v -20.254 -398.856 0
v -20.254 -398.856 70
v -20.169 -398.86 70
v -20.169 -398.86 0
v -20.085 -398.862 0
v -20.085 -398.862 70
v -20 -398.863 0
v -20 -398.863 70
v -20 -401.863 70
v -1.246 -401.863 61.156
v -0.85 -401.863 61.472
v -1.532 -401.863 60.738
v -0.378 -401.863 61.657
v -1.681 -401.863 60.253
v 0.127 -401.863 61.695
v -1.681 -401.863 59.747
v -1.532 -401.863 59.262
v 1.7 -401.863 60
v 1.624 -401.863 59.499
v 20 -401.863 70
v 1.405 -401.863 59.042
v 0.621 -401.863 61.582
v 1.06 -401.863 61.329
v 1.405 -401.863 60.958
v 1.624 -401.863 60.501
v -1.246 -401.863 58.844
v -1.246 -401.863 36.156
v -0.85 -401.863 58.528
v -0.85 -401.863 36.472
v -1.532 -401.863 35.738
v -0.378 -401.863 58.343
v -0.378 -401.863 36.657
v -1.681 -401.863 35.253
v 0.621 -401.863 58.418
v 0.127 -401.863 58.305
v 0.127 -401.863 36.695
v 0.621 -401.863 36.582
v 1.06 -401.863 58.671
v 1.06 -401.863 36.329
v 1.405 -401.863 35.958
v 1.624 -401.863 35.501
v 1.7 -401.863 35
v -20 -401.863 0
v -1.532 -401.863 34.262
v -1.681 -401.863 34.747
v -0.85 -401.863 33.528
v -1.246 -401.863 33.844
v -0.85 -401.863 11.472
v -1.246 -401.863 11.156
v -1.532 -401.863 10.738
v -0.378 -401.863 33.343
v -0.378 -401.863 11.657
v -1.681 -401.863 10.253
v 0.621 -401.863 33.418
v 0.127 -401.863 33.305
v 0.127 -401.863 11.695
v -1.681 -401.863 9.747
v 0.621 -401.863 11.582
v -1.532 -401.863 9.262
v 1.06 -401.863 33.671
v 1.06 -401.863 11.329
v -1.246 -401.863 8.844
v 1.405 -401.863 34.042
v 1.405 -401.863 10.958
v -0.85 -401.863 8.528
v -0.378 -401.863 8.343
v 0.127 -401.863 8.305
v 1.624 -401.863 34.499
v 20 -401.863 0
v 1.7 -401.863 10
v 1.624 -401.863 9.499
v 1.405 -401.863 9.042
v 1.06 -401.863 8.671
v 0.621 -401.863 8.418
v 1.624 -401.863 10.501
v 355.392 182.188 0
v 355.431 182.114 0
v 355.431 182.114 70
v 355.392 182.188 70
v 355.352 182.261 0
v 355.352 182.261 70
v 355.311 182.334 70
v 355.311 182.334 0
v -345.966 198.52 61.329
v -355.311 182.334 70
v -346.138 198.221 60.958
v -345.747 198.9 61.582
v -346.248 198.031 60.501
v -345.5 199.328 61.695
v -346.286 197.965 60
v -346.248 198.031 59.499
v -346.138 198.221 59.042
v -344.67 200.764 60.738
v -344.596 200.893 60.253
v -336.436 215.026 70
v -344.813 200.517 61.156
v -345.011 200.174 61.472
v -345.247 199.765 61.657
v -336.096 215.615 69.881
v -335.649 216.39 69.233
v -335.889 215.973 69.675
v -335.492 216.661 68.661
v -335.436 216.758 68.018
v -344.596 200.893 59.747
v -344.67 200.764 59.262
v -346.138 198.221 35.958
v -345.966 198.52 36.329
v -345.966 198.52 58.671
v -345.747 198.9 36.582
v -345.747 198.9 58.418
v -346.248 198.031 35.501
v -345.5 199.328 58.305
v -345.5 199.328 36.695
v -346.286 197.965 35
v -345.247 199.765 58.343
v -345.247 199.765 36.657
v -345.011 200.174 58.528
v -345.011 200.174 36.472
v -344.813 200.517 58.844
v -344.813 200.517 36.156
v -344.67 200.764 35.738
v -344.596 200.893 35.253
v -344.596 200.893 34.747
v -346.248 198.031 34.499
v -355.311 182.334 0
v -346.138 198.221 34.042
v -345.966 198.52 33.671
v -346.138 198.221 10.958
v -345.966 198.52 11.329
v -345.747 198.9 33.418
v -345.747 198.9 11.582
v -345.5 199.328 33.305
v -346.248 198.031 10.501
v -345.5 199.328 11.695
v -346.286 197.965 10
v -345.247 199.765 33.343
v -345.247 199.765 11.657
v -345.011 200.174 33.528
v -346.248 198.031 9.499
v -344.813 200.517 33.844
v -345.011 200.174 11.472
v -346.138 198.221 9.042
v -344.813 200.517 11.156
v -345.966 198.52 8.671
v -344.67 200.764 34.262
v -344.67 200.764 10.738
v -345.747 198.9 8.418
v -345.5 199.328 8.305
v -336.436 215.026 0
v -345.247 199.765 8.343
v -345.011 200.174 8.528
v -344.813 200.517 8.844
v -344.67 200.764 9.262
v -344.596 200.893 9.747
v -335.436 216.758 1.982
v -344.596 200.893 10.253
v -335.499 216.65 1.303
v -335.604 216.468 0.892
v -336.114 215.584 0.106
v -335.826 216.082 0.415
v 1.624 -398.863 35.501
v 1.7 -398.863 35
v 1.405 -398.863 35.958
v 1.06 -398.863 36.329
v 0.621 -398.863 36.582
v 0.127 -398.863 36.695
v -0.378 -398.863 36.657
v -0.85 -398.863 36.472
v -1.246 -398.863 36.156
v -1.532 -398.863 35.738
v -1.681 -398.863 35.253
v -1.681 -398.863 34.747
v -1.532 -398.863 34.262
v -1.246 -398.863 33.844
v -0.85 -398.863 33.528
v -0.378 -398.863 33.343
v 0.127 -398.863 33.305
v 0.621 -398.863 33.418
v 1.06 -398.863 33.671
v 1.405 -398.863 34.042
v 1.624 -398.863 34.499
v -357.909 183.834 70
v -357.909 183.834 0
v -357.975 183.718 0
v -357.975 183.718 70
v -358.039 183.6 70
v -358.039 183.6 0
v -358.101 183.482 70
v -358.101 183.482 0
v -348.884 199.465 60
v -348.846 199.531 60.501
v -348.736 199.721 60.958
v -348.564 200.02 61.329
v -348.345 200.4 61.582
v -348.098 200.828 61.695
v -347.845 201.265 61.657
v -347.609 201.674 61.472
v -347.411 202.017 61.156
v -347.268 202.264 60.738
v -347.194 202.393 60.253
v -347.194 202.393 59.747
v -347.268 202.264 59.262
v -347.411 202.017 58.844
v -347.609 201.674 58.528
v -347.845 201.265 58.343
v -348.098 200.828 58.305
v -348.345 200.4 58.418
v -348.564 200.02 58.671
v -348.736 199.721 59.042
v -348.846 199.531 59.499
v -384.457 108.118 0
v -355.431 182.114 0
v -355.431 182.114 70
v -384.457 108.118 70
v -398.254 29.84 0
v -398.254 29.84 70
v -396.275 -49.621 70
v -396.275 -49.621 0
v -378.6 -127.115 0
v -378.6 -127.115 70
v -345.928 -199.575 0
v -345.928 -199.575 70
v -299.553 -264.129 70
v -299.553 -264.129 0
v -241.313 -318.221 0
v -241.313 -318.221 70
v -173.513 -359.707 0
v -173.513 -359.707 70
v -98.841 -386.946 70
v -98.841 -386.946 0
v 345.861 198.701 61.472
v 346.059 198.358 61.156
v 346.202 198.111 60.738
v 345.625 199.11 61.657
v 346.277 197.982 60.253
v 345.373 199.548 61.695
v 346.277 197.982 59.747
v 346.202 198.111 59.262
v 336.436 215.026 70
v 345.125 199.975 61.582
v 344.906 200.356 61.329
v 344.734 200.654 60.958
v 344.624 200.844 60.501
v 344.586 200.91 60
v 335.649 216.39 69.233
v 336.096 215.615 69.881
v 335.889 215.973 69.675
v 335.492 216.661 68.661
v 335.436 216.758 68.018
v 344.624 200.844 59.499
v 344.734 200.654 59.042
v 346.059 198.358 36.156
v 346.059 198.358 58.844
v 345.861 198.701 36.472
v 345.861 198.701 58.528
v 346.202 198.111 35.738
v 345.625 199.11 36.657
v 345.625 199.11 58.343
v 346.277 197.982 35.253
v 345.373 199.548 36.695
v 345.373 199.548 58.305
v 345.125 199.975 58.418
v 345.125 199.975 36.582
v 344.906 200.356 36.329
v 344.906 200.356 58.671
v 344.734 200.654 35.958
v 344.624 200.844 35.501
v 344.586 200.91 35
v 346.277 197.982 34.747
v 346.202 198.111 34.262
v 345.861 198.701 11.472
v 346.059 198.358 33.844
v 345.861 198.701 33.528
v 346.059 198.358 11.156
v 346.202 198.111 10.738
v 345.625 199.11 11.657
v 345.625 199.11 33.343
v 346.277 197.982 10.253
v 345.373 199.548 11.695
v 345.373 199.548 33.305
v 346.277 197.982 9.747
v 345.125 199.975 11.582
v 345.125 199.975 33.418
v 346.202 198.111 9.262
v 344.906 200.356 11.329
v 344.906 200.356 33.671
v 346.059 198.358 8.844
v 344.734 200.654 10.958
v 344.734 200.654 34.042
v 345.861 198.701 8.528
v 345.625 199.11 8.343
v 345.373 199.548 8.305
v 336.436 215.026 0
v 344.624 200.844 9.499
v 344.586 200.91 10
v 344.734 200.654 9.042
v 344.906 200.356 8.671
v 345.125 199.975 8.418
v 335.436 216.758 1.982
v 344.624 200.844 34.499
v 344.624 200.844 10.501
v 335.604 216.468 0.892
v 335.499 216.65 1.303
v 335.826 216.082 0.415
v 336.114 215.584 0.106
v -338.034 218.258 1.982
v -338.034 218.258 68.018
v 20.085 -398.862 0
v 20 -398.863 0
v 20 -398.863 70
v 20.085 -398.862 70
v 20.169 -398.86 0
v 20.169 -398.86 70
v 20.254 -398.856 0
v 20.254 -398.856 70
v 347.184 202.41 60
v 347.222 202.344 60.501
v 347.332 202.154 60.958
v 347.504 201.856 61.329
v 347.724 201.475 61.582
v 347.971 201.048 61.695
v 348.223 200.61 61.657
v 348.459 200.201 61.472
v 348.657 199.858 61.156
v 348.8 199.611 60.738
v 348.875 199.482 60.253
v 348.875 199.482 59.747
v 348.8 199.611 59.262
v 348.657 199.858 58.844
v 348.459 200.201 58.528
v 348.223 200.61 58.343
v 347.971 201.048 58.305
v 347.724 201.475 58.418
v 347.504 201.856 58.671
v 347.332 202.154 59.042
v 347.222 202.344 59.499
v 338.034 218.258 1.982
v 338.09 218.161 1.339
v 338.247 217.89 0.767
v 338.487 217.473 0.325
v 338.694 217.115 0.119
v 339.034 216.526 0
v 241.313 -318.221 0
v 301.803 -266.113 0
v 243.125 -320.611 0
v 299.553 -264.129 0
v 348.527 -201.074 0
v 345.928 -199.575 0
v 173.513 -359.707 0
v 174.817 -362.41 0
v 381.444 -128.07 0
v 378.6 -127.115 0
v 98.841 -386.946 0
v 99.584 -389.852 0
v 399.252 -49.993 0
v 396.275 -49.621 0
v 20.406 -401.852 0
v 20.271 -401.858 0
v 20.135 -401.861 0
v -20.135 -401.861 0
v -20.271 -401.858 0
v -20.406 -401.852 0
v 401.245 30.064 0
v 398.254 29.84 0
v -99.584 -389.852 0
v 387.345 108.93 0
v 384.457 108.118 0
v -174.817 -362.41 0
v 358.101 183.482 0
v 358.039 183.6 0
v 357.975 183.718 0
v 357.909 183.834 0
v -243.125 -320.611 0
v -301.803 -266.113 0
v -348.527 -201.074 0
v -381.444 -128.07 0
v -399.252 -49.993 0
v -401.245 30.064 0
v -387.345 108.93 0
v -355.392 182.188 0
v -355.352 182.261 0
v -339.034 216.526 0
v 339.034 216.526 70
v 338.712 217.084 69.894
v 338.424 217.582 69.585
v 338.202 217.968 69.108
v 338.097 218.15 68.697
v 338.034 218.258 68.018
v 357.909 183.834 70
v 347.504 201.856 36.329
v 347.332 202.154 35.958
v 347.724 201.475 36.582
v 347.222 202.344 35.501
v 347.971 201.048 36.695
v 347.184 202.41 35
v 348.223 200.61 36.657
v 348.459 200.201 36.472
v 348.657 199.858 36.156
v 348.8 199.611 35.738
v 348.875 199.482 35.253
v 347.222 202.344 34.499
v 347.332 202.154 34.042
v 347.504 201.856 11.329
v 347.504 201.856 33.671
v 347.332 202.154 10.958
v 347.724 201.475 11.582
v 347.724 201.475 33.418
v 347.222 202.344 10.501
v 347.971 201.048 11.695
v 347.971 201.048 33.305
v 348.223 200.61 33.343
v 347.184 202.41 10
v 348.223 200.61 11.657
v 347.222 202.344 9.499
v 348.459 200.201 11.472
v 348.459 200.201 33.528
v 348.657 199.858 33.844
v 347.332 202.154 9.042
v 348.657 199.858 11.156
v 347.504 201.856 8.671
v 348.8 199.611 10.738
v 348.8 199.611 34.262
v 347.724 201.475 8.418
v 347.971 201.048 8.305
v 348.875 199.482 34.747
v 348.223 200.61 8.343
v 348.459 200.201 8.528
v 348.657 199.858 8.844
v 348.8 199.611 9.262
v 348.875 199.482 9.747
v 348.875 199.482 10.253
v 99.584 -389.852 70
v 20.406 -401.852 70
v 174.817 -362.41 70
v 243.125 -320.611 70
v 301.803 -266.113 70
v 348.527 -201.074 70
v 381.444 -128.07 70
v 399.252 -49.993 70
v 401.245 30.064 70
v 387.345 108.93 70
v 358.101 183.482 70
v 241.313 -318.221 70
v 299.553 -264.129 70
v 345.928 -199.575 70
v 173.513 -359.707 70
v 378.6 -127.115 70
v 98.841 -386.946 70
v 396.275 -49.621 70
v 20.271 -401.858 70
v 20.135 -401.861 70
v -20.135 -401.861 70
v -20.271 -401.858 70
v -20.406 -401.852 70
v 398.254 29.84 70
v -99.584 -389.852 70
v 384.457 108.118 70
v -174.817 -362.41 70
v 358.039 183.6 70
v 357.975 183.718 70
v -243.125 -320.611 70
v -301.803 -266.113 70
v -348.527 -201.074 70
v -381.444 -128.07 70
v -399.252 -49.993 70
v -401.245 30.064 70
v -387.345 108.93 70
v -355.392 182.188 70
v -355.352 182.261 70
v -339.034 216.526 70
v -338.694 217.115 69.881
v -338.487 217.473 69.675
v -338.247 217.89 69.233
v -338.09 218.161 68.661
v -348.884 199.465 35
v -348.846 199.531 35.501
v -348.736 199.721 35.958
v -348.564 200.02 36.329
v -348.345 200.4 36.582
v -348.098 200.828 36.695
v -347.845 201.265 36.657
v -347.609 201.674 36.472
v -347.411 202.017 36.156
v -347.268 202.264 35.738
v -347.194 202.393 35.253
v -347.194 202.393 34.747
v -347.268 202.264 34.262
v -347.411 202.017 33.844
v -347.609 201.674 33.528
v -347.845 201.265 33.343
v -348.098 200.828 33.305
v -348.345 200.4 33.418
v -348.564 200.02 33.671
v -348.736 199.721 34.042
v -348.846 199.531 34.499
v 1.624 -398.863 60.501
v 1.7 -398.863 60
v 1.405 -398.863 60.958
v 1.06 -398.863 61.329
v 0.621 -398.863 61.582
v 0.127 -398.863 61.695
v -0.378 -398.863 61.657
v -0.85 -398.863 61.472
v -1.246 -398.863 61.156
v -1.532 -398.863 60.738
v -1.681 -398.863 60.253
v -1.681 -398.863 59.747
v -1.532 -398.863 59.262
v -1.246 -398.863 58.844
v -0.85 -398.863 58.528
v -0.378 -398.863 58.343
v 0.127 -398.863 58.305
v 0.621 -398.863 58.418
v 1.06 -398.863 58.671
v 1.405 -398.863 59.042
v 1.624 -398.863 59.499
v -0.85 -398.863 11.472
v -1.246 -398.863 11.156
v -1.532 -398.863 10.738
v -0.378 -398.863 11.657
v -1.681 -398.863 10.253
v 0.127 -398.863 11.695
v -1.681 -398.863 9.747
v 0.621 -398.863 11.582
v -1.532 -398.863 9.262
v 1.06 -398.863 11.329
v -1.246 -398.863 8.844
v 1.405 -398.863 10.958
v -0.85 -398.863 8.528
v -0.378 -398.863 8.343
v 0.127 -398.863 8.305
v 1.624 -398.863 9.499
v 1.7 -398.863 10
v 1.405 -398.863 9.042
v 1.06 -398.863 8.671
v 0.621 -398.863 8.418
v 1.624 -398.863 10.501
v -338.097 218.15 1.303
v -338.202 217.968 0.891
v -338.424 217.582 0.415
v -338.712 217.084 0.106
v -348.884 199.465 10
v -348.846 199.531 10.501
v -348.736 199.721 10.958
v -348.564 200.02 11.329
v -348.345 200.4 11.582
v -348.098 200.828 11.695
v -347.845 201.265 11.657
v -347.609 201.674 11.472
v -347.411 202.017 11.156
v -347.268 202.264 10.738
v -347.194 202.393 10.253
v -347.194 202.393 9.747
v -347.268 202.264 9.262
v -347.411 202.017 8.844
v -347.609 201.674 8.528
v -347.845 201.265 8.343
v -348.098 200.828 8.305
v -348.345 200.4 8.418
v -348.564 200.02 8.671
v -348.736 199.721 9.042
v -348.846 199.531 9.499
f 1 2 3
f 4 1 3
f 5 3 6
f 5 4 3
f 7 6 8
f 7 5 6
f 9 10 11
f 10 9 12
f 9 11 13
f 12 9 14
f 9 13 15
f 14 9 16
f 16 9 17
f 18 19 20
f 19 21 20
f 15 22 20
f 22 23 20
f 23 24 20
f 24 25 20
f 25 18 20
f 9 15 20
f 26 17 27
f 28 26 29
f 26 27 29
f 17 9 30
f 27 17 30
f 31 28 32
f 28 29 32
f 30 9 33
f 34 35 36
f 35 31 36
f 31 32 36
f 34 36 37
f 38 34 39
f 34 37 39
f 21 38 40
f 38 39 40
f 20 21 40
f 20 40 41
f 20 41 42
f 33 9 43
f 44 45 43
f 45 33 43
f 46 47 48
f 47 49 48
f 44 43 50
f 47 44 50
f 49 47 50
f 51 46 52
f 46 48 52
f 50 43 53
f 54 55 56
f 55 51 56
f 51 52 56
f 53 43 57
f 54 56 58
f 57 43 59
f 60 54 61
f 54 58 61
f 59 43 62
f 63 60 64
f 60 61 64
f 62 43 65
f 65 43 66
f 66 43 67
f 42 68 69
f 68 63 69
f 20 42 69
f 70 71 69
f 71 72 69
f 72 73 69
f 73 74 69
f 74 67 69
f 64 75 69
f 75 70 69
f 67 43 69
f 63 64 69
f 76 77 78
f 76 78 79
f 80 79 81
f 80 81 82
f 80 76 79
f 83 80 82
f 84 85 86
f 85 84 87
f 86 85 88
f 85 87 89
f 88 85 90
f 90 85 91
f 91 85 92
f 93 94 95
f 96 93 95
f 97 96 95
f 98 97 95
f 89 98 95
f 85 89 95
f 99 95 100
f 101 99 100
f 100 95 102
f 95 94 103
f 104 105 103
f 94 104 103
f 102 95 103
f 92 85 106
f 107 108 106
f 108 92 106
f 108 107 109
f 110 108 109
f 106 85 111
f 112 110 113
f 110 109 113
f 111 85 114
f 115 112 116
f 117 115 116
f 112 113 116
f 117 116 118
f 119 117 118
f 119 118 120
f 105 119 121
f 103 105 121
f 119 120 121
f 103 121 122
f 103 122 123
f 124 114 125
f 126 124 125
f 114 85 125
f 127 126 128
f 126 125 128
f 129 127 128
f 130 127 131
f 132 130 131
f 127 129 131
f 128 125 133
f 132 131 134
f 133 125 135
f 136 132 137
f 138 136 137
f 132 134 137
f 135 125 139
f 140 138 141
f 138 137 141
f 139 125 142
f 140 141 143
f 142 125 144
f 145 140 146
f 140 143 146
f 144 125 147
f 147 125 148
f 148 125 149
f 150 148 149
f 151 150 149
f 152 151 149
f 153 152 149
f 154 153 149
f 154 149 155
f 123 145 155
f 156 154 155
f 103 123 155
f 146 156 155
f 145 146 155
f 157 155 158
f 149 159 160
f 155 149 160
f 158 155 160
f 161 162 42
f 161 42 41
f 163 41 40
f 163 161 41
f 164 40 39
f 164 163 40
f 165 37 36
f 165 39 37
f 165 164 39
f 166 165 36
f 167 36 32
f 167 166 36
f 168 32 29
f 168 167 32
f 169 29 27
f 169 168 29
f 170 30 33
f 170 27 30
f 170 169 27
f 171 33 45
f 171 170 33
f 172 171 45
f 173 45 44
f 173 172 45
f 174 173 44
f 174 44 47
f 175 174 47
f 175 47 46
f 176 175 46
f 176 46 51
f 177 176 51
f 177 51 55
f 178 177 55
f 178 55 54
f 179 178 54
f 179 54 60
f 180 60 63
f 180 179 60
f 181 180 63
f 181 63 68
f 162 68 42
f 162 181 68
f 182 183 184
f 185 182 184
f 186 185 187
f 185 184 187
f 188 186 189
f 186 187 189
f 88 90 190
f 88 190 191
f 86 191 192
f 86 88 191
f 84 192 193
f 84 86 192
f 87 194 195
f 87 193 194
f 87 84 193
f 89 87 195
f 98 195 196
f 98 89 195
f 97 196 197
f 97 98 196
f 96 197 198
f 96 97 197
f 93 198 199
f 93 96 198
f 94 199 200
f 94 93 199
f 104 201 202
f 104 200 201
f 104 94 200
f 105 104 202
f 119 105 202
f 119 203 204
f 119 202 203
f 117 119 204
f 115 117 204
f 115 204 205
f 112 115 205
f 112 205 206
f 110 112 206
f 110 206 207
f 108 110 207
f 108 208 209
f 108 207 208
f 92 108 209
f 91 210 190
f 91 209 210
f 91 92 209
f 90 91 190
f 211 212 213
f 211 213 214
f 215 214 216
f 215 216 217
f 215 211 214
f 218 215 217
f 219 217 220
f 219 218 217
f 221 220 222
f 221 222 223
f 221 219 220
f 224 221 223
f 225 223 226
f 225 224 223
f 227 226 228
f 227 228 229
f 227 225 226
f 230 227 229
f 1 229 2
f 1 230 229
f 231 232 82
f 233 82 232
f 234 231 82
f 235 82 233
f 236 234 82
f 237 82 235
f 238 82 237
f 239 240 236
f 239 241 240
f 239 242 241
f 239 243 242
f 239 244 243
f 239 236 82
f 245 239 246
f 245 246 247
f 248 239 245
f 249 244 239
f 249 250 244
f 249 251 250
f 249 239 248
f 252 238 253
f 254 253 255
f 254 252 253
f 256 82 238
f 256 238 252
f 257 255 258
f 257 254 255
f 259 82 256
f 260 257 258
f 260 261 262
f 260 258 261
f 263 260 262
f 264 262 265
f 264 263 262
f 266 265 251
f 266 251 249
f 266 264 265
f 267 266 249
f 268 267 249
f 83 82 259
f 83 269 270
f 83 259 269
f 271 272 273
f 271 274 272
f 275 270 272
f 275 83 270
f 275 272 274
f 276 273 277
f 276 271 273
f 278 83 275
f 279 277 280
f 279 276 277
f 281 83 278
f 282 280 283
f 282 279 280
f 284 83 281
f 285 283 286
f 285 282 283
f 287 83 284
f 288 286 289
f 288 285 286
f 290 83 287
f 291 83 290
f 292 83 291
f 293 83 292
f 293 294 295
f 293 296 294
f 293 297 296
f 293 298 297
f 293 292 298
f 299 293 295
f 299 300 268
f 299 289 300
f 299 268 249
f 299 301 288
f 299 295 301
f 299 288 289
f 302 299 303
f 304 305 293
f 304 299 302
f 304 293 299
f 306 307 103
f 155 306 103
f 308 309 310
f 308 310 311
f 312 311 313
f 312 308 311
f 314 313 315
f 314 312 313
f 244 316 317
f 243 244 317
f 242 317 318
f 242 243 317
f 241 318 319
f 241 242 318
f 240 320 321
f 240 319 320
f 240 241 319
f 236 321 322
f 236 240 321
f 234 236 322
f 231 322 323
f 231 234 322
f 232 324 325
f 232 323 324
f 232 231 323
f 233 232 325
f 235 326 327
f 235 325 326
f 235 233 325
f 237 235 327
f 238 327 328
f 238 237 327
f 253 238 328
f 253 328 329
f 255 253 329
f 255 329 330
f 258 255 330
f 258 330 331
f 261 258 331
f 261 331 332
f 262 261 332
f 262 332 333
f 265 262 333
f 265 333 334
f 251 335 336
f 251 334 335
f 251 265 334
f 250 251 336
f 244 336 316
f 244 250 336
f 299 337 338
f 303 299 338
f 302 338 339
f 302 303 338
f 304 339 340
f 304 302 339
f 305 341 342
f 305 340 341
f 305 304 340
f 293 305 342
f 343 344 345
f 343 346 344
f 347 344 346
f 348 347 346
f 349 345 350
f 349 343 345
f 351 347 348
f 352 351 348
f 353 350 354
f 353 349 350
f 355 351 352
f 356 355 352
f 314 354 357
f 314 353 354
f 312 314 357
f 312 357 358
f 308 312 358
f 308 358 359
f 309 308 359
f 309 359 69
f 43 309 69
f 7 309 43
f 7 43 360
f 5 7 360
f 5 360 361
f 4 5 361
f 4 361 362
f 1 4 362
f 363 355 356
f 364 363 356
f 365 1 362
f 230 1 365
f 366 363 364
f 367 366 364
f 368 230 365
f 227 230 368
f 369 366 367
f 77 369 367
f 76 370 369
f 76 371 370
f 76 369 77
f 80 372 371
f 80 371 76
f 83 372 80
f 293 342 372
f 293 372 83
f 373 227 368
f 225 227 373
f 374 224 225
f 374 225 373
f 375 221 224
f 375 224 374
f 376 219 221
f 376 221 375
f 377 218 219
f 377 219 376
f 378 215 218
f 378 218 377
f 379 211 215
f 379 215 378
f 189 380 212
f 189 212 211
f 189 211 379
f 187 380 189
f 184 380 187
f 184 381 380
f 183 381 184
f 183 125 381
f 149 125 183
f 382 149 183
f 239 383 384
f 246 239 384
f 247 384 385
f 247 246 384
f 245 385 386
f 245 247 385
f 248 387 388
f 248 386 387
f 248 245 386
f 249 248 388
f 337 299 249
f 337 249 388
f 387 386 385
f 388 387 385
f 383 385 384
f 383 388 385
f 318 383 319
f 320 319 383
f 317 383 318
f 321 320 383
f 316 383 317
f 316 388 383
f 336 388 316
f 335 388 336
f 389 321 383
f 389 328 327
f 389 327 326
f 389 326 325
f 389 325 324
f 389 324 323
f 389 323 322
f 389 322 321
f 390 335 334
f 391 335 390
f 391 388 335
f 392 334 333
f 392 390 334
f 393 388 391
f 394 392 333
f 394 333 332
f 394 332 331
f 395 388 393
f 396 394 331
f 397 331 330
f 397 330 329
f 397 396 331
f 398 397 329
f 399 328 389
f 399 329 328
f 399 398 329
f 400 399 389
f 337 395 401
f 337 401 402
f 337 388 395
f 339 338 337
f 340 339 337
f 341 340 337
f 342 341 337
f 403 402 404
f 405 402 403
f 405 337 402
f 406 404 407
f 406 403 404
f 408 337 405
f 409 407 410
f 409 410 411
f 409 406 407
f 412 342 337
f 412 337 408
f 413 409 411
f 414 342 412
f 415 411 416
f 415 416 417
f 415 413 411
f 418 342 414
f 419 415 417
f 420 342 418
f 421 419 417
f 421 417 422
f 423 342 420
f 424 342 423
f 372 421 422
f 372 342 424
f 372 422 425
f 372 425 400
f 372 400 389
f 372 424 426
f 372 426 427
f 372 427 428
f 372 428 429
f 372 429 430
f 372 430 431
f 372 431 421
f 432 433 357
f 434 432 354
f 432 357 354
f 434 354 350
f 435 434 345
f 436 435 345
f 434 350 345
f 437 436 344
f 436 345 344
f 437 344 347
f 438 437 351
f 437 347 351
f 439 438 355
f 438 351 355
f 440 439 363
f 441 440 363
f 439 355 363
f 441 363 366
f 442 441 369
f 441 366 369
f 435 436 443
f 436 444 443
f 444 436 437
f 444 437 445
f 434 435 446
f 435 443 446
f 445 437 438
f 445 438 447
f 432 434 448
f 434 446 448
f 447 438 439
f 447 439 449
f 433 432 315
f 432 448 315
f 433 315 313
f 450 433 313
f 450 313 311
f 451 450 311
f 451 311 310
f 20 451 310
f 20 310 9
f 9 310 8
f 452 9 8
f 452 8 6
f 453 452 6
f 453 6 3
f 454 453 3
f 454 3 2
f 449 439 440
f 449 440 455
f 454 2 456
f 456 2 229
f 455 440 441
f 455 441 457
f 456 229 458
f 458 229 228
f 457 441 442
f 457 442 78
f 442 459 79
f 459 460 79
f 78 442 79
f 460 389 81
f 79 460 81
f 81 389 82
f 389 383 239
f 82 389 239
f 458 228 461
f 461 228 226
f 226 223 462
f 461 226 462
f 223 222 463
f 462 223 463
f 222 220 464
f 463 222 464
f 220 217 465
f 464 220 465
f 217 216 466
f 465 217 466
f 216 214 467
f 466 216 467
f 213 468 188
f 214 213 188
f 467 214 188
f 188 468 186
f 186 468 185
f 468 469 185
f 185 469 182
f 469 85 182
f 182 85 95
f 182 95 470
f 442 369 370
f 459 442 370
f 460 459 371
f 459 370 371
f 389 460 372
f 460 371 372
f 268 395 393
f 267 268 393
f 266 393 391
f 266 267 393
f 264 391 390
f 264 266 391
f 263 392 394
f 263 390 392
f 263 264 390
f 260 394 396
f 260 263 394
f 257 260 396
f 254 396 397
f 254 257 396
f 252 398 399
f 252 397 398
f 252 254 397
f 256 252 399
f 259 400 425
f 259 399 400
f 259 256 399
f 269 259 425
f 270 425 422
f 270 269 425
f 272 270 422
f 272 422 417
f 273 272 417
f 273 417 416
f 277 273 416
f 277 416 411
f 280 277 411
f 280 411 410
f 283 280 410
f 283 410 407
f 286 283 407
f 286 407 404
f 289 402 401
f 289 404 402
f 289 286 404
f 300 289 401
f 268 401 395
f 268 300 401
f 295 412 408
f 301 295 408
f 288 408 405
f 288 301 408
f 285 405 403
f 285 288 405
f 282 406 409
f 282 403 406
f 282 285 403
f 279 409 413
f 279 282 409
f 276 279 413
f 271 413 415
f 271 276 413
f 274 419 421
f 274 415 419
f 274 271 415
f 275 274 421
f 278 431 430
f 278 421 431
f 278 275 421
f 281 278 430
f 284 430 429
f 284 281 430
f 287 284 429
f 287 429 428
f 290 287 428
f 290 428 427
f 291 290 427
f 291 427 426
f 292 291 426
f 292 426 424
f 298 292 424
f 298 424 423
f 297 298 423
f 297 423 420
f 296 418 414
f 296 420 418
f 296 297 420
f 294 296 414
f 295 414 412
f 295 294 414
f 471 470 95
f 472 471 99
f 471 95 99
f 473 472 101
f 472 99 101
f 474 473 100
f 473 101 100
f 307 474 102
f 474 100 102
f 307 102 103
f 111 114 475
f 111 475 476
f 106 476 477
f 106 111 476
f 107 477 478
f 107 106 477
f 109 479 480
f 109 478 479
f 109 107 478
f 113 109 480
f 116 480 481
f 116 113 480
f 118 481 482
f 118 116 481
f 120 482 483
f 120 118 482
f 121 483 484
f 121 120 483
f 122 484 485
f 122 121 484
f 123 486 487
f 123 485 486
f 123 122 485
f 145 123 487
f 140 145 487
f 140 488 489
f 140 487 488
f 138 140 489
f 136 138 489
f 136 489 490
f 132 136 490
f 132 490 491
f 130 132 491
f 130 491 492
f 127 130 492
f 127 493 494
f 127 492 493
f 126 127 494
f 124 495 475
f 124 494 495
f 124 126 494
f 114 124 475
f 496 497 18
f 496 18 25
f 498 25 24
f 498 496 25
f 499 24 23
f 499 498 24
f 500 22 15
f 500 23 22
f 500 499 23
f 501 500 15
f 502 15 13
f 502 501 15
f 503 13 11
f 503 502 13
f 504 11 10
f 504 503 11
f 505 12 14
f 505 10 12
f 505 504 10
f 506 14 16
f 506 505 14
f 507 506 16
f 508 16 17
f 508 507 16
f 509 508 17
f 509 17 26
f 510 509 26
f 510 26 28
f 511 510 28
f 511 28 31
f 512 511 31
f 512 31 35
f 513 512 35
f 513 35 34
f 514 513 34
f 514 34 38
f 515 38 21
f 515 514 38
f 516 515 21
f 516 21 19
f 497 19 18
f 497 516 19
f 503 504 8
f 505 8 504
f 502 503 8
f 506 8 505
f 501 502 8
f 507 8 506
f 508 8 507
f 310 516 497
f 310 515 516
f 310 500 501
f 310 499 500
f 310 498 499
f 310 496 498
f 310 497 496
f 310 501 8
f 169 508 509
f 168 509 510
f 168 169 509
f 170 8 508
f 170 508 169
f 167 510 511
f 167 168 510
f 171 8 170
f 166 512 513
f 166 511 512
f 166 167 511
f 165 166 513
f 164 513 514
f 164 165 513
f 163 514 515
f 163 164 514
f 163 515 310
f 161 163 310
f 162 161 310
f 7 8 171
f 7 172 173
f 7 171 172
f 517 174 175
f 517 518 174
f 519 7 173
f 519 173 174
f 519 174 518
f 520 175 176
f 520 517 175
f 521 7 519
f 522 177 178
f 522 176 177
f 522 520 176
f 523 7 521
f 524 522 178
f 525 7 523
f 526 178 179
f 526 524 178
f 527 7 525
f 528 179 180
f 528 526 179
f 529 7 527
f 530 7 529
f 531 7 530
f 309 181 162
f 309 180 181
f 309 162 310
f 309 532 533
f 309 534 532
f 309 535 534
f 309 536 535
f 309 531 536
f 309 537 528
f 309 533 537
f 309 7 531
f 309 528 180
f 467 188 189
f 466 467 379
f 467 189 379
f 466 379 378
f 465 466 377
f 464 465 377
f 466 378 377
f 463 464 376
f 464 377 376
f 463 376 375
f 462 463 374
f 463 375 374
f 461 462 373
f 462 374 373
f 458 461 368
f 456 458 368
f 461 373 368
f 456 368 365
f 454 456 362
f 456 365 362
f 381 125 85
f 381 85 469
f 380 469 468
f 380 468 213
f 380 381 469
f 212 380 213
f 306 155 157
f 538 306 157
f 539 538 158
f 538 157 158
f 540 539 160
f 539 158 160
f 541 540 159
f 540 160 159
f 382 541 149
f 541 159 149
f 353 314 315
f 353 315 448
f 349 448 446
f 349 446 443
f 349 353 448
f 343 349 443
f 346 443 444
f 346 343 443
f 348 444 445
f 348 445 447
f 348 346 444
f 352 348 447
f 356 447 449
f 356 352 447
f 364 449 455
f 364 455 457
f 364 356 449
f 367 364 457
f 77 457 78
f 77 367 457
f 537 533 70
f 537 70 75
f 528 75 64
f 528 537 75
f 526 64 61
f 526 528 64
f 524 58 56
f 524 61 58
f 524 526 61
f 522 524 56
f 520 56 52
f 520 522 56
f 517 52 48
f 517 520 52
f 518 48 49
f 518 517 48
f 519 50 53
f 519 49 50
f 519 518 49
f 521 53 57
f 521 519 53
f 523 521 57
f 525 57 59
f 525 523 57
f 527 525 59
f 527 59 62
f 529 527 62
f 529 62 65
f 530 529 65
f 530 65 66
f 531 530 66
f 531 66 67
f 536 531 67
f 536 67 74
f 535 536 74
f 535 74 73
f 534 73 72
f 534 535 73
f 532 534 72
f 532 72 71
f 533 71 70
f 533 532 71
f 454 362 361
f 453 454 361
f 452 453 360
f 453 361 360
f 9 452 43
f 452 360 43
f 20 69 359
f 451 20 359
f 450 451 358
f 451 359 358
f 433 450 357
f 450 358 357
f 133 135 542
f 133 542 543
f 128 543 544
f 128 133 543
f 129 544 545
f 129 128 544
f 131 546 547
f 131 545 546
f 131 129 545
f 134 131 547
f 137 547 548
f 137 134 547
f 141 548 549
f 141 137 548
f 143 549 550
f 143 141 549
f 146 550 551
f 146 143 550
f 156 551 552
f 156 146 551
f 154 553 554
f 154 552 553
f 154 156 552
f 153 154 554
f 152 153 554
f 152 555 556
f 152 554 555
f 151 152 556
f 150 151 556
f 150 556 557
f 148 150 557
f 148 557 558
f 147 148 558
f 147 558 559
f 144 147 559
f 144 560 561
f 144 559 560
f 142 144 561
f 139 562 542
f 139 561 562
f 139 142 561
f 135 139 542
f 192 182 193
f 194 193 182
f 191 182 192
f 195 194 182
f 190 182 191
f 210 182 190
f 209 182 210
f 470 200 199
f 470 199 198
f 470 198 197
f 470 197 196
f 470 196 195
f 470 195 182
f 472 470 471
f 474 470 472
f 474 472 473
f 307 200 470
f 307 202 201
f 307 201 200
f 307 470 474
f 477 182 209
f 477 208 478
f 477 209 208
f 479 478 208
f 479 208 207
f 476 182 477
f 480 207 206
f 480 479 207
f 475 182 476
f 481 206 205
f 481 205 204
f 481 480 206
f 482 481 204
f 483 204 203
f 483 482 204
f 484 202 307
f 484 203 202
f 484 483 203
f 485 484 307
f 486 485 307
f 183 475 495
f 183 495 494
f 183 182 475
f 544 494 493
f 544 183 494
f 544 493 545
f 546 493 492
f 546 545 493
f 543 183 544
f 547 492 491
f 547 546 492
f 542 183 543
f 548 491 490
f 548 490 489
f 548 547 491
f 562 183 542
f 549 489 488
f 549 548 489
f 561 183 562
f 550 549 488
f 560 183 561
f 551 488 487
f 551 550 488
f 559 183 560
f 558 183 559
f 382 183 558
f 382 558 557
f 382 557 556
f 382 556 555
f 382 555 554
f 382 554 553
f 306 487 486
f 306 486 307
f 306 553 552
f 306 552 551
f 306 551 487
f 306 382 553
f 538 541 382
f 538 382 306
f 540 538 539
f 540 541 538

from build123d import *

# Parameters (mm, degrees)
PAD001_DEPTH          = 70
SKETCH007_R           = 1.7
POCKET002_DEPTH       = 2438.582526
POLARPATTERN001_COUNT = 3
POCKET003_DEPTH       = 2494.311679


with BuildPart() as part:
    # Sketch006 → Pad001 (new body)
    with BuildSketch(Plane.XY):
        with BuildLine():
            ThreePointArc((20.253569, -398.856102), (345.928021, -199.575052), (355.430597, 182.113941))
            ThreePointArc((355.430597, 182.113941), (355.372093, 182.224683), (355.310833, 182.333925))
            Line((355.310833, 182.333925), (335.436031, 216.758093))
            Line((335.436031, 216.758093), (338.034107, 218.258093))
            Line((338.034107, 218.258093), (357.90891, 183.833925))
            ThreePointArc((358.100532, 183.48195), (358.006925, 183.659138), (357.90891, 183.833925))
            ThreePointArc((20.40571, -401.852241), (348.526574, -201.074226), (358.100532, 183.48195))
            ThreePointArc((20, -401.862536), (20.20292, -401.859962), (20.40571, -401.852241))
            Line((-20, -401.862536), (20, -401.862536))
            ThreePointArc((-20.40571, -401.852241), (-20.20292, -401.859962), (-20, -401.862536))
            ThreePointArc((-358.100532, 183.48195), (-348.526574, -201.074226), (-20.40571, -401.852241))
            ThreePointArc((-357.90891, 183.833925), (-358.006925, 183.659138), (-358.100532, 183.48195))
            Line((-357.90891, 183.833925), (-338.034107, 218.258093))
            Line((-338.034107, 218.258093), (-335.436031, 216.758093))
            Line((-355.310833, 182.333925), (-335.436031, 216.758093))
            ThreePointArc((-355.310833, 182.333925), (-355.372093, 182.224683), (-355.430597, 182.113941))
            ThreePointArc((-355.430597, 182.113941), (-345.928021, -199.575052), (-20.253569, -398.856102))
            ThreePointArc((-20.253569, -398.856102), (-20.126825, -398.860927), (-20, -398.862536))
            Line((-20, -398.862536), (20, -398.862536))
            ThreePointArc((20, -398.862536), (20.126825, -398.860927), (20.253569, -398.856102))
        make_face()
    extrude(amount=PAD001_DEPTH)

    # Sketch007 → Pocket002 (cut, through all)
    with BuildSketch(Plane.XZ):
        with Locations((0, 35)):
            Circle(SKETCH007_R)
        with Locations((0, 60)):
            Circle(SKETCH007_R)
        with Locations((0, 10)):
            Circle(SKETCH007_R)
    pocket002 = extrude(amount=POCKET002_DEPTH, mode=Mode.SUBTRACT)

    # PolarPattern001: Pocket002 ×3 about axis
    polarpattern001_axis = Axis((0, 0, 0), (0, 0, 1))
    for i in range(1, POLARPATTERN001_COUNT):
        add(pocket002.rotate(polarpattern001_axis, i * 360 / POLARPATTERN001_COUNT), mode=Mode.SUBTRACT)

    # Sketch008 → Pocket003 (cut, through all)
    with BuildSketch(Plane(origin=(0, 0, 0), x_dir=(0.5, -0.866025, 0), z_dir=(-0.866025, -0.5, 0))):
        with BuildLine():
            ThreePointArc((-20, 2.000018), (-19.414214, 0.585786), (-17.999982, 0))
            Line((-20, 0), (-17.999982, 0))
            Line((-20, 2.000018), (-20, 0))
        make_face()
        with BuildLine():
            ThreePointArc((-17.999982, 70), (-19.414209, 69.414209), (-20, 67.999982))
            Line((-20, 67.999982), (-20, 70))
            Line((-20, 70), (-17.999982, 70))
        make_face()
    pocket003 = extrude(amount=-POCKET003_DEPTH, mode=Mode.SUBTRACT)

    # Mirrored002: Pocket003 across YZ
    add(pocket003.mirror(Plane.YZ), mode=Mode.SUBTRACT)


solid = part.part
